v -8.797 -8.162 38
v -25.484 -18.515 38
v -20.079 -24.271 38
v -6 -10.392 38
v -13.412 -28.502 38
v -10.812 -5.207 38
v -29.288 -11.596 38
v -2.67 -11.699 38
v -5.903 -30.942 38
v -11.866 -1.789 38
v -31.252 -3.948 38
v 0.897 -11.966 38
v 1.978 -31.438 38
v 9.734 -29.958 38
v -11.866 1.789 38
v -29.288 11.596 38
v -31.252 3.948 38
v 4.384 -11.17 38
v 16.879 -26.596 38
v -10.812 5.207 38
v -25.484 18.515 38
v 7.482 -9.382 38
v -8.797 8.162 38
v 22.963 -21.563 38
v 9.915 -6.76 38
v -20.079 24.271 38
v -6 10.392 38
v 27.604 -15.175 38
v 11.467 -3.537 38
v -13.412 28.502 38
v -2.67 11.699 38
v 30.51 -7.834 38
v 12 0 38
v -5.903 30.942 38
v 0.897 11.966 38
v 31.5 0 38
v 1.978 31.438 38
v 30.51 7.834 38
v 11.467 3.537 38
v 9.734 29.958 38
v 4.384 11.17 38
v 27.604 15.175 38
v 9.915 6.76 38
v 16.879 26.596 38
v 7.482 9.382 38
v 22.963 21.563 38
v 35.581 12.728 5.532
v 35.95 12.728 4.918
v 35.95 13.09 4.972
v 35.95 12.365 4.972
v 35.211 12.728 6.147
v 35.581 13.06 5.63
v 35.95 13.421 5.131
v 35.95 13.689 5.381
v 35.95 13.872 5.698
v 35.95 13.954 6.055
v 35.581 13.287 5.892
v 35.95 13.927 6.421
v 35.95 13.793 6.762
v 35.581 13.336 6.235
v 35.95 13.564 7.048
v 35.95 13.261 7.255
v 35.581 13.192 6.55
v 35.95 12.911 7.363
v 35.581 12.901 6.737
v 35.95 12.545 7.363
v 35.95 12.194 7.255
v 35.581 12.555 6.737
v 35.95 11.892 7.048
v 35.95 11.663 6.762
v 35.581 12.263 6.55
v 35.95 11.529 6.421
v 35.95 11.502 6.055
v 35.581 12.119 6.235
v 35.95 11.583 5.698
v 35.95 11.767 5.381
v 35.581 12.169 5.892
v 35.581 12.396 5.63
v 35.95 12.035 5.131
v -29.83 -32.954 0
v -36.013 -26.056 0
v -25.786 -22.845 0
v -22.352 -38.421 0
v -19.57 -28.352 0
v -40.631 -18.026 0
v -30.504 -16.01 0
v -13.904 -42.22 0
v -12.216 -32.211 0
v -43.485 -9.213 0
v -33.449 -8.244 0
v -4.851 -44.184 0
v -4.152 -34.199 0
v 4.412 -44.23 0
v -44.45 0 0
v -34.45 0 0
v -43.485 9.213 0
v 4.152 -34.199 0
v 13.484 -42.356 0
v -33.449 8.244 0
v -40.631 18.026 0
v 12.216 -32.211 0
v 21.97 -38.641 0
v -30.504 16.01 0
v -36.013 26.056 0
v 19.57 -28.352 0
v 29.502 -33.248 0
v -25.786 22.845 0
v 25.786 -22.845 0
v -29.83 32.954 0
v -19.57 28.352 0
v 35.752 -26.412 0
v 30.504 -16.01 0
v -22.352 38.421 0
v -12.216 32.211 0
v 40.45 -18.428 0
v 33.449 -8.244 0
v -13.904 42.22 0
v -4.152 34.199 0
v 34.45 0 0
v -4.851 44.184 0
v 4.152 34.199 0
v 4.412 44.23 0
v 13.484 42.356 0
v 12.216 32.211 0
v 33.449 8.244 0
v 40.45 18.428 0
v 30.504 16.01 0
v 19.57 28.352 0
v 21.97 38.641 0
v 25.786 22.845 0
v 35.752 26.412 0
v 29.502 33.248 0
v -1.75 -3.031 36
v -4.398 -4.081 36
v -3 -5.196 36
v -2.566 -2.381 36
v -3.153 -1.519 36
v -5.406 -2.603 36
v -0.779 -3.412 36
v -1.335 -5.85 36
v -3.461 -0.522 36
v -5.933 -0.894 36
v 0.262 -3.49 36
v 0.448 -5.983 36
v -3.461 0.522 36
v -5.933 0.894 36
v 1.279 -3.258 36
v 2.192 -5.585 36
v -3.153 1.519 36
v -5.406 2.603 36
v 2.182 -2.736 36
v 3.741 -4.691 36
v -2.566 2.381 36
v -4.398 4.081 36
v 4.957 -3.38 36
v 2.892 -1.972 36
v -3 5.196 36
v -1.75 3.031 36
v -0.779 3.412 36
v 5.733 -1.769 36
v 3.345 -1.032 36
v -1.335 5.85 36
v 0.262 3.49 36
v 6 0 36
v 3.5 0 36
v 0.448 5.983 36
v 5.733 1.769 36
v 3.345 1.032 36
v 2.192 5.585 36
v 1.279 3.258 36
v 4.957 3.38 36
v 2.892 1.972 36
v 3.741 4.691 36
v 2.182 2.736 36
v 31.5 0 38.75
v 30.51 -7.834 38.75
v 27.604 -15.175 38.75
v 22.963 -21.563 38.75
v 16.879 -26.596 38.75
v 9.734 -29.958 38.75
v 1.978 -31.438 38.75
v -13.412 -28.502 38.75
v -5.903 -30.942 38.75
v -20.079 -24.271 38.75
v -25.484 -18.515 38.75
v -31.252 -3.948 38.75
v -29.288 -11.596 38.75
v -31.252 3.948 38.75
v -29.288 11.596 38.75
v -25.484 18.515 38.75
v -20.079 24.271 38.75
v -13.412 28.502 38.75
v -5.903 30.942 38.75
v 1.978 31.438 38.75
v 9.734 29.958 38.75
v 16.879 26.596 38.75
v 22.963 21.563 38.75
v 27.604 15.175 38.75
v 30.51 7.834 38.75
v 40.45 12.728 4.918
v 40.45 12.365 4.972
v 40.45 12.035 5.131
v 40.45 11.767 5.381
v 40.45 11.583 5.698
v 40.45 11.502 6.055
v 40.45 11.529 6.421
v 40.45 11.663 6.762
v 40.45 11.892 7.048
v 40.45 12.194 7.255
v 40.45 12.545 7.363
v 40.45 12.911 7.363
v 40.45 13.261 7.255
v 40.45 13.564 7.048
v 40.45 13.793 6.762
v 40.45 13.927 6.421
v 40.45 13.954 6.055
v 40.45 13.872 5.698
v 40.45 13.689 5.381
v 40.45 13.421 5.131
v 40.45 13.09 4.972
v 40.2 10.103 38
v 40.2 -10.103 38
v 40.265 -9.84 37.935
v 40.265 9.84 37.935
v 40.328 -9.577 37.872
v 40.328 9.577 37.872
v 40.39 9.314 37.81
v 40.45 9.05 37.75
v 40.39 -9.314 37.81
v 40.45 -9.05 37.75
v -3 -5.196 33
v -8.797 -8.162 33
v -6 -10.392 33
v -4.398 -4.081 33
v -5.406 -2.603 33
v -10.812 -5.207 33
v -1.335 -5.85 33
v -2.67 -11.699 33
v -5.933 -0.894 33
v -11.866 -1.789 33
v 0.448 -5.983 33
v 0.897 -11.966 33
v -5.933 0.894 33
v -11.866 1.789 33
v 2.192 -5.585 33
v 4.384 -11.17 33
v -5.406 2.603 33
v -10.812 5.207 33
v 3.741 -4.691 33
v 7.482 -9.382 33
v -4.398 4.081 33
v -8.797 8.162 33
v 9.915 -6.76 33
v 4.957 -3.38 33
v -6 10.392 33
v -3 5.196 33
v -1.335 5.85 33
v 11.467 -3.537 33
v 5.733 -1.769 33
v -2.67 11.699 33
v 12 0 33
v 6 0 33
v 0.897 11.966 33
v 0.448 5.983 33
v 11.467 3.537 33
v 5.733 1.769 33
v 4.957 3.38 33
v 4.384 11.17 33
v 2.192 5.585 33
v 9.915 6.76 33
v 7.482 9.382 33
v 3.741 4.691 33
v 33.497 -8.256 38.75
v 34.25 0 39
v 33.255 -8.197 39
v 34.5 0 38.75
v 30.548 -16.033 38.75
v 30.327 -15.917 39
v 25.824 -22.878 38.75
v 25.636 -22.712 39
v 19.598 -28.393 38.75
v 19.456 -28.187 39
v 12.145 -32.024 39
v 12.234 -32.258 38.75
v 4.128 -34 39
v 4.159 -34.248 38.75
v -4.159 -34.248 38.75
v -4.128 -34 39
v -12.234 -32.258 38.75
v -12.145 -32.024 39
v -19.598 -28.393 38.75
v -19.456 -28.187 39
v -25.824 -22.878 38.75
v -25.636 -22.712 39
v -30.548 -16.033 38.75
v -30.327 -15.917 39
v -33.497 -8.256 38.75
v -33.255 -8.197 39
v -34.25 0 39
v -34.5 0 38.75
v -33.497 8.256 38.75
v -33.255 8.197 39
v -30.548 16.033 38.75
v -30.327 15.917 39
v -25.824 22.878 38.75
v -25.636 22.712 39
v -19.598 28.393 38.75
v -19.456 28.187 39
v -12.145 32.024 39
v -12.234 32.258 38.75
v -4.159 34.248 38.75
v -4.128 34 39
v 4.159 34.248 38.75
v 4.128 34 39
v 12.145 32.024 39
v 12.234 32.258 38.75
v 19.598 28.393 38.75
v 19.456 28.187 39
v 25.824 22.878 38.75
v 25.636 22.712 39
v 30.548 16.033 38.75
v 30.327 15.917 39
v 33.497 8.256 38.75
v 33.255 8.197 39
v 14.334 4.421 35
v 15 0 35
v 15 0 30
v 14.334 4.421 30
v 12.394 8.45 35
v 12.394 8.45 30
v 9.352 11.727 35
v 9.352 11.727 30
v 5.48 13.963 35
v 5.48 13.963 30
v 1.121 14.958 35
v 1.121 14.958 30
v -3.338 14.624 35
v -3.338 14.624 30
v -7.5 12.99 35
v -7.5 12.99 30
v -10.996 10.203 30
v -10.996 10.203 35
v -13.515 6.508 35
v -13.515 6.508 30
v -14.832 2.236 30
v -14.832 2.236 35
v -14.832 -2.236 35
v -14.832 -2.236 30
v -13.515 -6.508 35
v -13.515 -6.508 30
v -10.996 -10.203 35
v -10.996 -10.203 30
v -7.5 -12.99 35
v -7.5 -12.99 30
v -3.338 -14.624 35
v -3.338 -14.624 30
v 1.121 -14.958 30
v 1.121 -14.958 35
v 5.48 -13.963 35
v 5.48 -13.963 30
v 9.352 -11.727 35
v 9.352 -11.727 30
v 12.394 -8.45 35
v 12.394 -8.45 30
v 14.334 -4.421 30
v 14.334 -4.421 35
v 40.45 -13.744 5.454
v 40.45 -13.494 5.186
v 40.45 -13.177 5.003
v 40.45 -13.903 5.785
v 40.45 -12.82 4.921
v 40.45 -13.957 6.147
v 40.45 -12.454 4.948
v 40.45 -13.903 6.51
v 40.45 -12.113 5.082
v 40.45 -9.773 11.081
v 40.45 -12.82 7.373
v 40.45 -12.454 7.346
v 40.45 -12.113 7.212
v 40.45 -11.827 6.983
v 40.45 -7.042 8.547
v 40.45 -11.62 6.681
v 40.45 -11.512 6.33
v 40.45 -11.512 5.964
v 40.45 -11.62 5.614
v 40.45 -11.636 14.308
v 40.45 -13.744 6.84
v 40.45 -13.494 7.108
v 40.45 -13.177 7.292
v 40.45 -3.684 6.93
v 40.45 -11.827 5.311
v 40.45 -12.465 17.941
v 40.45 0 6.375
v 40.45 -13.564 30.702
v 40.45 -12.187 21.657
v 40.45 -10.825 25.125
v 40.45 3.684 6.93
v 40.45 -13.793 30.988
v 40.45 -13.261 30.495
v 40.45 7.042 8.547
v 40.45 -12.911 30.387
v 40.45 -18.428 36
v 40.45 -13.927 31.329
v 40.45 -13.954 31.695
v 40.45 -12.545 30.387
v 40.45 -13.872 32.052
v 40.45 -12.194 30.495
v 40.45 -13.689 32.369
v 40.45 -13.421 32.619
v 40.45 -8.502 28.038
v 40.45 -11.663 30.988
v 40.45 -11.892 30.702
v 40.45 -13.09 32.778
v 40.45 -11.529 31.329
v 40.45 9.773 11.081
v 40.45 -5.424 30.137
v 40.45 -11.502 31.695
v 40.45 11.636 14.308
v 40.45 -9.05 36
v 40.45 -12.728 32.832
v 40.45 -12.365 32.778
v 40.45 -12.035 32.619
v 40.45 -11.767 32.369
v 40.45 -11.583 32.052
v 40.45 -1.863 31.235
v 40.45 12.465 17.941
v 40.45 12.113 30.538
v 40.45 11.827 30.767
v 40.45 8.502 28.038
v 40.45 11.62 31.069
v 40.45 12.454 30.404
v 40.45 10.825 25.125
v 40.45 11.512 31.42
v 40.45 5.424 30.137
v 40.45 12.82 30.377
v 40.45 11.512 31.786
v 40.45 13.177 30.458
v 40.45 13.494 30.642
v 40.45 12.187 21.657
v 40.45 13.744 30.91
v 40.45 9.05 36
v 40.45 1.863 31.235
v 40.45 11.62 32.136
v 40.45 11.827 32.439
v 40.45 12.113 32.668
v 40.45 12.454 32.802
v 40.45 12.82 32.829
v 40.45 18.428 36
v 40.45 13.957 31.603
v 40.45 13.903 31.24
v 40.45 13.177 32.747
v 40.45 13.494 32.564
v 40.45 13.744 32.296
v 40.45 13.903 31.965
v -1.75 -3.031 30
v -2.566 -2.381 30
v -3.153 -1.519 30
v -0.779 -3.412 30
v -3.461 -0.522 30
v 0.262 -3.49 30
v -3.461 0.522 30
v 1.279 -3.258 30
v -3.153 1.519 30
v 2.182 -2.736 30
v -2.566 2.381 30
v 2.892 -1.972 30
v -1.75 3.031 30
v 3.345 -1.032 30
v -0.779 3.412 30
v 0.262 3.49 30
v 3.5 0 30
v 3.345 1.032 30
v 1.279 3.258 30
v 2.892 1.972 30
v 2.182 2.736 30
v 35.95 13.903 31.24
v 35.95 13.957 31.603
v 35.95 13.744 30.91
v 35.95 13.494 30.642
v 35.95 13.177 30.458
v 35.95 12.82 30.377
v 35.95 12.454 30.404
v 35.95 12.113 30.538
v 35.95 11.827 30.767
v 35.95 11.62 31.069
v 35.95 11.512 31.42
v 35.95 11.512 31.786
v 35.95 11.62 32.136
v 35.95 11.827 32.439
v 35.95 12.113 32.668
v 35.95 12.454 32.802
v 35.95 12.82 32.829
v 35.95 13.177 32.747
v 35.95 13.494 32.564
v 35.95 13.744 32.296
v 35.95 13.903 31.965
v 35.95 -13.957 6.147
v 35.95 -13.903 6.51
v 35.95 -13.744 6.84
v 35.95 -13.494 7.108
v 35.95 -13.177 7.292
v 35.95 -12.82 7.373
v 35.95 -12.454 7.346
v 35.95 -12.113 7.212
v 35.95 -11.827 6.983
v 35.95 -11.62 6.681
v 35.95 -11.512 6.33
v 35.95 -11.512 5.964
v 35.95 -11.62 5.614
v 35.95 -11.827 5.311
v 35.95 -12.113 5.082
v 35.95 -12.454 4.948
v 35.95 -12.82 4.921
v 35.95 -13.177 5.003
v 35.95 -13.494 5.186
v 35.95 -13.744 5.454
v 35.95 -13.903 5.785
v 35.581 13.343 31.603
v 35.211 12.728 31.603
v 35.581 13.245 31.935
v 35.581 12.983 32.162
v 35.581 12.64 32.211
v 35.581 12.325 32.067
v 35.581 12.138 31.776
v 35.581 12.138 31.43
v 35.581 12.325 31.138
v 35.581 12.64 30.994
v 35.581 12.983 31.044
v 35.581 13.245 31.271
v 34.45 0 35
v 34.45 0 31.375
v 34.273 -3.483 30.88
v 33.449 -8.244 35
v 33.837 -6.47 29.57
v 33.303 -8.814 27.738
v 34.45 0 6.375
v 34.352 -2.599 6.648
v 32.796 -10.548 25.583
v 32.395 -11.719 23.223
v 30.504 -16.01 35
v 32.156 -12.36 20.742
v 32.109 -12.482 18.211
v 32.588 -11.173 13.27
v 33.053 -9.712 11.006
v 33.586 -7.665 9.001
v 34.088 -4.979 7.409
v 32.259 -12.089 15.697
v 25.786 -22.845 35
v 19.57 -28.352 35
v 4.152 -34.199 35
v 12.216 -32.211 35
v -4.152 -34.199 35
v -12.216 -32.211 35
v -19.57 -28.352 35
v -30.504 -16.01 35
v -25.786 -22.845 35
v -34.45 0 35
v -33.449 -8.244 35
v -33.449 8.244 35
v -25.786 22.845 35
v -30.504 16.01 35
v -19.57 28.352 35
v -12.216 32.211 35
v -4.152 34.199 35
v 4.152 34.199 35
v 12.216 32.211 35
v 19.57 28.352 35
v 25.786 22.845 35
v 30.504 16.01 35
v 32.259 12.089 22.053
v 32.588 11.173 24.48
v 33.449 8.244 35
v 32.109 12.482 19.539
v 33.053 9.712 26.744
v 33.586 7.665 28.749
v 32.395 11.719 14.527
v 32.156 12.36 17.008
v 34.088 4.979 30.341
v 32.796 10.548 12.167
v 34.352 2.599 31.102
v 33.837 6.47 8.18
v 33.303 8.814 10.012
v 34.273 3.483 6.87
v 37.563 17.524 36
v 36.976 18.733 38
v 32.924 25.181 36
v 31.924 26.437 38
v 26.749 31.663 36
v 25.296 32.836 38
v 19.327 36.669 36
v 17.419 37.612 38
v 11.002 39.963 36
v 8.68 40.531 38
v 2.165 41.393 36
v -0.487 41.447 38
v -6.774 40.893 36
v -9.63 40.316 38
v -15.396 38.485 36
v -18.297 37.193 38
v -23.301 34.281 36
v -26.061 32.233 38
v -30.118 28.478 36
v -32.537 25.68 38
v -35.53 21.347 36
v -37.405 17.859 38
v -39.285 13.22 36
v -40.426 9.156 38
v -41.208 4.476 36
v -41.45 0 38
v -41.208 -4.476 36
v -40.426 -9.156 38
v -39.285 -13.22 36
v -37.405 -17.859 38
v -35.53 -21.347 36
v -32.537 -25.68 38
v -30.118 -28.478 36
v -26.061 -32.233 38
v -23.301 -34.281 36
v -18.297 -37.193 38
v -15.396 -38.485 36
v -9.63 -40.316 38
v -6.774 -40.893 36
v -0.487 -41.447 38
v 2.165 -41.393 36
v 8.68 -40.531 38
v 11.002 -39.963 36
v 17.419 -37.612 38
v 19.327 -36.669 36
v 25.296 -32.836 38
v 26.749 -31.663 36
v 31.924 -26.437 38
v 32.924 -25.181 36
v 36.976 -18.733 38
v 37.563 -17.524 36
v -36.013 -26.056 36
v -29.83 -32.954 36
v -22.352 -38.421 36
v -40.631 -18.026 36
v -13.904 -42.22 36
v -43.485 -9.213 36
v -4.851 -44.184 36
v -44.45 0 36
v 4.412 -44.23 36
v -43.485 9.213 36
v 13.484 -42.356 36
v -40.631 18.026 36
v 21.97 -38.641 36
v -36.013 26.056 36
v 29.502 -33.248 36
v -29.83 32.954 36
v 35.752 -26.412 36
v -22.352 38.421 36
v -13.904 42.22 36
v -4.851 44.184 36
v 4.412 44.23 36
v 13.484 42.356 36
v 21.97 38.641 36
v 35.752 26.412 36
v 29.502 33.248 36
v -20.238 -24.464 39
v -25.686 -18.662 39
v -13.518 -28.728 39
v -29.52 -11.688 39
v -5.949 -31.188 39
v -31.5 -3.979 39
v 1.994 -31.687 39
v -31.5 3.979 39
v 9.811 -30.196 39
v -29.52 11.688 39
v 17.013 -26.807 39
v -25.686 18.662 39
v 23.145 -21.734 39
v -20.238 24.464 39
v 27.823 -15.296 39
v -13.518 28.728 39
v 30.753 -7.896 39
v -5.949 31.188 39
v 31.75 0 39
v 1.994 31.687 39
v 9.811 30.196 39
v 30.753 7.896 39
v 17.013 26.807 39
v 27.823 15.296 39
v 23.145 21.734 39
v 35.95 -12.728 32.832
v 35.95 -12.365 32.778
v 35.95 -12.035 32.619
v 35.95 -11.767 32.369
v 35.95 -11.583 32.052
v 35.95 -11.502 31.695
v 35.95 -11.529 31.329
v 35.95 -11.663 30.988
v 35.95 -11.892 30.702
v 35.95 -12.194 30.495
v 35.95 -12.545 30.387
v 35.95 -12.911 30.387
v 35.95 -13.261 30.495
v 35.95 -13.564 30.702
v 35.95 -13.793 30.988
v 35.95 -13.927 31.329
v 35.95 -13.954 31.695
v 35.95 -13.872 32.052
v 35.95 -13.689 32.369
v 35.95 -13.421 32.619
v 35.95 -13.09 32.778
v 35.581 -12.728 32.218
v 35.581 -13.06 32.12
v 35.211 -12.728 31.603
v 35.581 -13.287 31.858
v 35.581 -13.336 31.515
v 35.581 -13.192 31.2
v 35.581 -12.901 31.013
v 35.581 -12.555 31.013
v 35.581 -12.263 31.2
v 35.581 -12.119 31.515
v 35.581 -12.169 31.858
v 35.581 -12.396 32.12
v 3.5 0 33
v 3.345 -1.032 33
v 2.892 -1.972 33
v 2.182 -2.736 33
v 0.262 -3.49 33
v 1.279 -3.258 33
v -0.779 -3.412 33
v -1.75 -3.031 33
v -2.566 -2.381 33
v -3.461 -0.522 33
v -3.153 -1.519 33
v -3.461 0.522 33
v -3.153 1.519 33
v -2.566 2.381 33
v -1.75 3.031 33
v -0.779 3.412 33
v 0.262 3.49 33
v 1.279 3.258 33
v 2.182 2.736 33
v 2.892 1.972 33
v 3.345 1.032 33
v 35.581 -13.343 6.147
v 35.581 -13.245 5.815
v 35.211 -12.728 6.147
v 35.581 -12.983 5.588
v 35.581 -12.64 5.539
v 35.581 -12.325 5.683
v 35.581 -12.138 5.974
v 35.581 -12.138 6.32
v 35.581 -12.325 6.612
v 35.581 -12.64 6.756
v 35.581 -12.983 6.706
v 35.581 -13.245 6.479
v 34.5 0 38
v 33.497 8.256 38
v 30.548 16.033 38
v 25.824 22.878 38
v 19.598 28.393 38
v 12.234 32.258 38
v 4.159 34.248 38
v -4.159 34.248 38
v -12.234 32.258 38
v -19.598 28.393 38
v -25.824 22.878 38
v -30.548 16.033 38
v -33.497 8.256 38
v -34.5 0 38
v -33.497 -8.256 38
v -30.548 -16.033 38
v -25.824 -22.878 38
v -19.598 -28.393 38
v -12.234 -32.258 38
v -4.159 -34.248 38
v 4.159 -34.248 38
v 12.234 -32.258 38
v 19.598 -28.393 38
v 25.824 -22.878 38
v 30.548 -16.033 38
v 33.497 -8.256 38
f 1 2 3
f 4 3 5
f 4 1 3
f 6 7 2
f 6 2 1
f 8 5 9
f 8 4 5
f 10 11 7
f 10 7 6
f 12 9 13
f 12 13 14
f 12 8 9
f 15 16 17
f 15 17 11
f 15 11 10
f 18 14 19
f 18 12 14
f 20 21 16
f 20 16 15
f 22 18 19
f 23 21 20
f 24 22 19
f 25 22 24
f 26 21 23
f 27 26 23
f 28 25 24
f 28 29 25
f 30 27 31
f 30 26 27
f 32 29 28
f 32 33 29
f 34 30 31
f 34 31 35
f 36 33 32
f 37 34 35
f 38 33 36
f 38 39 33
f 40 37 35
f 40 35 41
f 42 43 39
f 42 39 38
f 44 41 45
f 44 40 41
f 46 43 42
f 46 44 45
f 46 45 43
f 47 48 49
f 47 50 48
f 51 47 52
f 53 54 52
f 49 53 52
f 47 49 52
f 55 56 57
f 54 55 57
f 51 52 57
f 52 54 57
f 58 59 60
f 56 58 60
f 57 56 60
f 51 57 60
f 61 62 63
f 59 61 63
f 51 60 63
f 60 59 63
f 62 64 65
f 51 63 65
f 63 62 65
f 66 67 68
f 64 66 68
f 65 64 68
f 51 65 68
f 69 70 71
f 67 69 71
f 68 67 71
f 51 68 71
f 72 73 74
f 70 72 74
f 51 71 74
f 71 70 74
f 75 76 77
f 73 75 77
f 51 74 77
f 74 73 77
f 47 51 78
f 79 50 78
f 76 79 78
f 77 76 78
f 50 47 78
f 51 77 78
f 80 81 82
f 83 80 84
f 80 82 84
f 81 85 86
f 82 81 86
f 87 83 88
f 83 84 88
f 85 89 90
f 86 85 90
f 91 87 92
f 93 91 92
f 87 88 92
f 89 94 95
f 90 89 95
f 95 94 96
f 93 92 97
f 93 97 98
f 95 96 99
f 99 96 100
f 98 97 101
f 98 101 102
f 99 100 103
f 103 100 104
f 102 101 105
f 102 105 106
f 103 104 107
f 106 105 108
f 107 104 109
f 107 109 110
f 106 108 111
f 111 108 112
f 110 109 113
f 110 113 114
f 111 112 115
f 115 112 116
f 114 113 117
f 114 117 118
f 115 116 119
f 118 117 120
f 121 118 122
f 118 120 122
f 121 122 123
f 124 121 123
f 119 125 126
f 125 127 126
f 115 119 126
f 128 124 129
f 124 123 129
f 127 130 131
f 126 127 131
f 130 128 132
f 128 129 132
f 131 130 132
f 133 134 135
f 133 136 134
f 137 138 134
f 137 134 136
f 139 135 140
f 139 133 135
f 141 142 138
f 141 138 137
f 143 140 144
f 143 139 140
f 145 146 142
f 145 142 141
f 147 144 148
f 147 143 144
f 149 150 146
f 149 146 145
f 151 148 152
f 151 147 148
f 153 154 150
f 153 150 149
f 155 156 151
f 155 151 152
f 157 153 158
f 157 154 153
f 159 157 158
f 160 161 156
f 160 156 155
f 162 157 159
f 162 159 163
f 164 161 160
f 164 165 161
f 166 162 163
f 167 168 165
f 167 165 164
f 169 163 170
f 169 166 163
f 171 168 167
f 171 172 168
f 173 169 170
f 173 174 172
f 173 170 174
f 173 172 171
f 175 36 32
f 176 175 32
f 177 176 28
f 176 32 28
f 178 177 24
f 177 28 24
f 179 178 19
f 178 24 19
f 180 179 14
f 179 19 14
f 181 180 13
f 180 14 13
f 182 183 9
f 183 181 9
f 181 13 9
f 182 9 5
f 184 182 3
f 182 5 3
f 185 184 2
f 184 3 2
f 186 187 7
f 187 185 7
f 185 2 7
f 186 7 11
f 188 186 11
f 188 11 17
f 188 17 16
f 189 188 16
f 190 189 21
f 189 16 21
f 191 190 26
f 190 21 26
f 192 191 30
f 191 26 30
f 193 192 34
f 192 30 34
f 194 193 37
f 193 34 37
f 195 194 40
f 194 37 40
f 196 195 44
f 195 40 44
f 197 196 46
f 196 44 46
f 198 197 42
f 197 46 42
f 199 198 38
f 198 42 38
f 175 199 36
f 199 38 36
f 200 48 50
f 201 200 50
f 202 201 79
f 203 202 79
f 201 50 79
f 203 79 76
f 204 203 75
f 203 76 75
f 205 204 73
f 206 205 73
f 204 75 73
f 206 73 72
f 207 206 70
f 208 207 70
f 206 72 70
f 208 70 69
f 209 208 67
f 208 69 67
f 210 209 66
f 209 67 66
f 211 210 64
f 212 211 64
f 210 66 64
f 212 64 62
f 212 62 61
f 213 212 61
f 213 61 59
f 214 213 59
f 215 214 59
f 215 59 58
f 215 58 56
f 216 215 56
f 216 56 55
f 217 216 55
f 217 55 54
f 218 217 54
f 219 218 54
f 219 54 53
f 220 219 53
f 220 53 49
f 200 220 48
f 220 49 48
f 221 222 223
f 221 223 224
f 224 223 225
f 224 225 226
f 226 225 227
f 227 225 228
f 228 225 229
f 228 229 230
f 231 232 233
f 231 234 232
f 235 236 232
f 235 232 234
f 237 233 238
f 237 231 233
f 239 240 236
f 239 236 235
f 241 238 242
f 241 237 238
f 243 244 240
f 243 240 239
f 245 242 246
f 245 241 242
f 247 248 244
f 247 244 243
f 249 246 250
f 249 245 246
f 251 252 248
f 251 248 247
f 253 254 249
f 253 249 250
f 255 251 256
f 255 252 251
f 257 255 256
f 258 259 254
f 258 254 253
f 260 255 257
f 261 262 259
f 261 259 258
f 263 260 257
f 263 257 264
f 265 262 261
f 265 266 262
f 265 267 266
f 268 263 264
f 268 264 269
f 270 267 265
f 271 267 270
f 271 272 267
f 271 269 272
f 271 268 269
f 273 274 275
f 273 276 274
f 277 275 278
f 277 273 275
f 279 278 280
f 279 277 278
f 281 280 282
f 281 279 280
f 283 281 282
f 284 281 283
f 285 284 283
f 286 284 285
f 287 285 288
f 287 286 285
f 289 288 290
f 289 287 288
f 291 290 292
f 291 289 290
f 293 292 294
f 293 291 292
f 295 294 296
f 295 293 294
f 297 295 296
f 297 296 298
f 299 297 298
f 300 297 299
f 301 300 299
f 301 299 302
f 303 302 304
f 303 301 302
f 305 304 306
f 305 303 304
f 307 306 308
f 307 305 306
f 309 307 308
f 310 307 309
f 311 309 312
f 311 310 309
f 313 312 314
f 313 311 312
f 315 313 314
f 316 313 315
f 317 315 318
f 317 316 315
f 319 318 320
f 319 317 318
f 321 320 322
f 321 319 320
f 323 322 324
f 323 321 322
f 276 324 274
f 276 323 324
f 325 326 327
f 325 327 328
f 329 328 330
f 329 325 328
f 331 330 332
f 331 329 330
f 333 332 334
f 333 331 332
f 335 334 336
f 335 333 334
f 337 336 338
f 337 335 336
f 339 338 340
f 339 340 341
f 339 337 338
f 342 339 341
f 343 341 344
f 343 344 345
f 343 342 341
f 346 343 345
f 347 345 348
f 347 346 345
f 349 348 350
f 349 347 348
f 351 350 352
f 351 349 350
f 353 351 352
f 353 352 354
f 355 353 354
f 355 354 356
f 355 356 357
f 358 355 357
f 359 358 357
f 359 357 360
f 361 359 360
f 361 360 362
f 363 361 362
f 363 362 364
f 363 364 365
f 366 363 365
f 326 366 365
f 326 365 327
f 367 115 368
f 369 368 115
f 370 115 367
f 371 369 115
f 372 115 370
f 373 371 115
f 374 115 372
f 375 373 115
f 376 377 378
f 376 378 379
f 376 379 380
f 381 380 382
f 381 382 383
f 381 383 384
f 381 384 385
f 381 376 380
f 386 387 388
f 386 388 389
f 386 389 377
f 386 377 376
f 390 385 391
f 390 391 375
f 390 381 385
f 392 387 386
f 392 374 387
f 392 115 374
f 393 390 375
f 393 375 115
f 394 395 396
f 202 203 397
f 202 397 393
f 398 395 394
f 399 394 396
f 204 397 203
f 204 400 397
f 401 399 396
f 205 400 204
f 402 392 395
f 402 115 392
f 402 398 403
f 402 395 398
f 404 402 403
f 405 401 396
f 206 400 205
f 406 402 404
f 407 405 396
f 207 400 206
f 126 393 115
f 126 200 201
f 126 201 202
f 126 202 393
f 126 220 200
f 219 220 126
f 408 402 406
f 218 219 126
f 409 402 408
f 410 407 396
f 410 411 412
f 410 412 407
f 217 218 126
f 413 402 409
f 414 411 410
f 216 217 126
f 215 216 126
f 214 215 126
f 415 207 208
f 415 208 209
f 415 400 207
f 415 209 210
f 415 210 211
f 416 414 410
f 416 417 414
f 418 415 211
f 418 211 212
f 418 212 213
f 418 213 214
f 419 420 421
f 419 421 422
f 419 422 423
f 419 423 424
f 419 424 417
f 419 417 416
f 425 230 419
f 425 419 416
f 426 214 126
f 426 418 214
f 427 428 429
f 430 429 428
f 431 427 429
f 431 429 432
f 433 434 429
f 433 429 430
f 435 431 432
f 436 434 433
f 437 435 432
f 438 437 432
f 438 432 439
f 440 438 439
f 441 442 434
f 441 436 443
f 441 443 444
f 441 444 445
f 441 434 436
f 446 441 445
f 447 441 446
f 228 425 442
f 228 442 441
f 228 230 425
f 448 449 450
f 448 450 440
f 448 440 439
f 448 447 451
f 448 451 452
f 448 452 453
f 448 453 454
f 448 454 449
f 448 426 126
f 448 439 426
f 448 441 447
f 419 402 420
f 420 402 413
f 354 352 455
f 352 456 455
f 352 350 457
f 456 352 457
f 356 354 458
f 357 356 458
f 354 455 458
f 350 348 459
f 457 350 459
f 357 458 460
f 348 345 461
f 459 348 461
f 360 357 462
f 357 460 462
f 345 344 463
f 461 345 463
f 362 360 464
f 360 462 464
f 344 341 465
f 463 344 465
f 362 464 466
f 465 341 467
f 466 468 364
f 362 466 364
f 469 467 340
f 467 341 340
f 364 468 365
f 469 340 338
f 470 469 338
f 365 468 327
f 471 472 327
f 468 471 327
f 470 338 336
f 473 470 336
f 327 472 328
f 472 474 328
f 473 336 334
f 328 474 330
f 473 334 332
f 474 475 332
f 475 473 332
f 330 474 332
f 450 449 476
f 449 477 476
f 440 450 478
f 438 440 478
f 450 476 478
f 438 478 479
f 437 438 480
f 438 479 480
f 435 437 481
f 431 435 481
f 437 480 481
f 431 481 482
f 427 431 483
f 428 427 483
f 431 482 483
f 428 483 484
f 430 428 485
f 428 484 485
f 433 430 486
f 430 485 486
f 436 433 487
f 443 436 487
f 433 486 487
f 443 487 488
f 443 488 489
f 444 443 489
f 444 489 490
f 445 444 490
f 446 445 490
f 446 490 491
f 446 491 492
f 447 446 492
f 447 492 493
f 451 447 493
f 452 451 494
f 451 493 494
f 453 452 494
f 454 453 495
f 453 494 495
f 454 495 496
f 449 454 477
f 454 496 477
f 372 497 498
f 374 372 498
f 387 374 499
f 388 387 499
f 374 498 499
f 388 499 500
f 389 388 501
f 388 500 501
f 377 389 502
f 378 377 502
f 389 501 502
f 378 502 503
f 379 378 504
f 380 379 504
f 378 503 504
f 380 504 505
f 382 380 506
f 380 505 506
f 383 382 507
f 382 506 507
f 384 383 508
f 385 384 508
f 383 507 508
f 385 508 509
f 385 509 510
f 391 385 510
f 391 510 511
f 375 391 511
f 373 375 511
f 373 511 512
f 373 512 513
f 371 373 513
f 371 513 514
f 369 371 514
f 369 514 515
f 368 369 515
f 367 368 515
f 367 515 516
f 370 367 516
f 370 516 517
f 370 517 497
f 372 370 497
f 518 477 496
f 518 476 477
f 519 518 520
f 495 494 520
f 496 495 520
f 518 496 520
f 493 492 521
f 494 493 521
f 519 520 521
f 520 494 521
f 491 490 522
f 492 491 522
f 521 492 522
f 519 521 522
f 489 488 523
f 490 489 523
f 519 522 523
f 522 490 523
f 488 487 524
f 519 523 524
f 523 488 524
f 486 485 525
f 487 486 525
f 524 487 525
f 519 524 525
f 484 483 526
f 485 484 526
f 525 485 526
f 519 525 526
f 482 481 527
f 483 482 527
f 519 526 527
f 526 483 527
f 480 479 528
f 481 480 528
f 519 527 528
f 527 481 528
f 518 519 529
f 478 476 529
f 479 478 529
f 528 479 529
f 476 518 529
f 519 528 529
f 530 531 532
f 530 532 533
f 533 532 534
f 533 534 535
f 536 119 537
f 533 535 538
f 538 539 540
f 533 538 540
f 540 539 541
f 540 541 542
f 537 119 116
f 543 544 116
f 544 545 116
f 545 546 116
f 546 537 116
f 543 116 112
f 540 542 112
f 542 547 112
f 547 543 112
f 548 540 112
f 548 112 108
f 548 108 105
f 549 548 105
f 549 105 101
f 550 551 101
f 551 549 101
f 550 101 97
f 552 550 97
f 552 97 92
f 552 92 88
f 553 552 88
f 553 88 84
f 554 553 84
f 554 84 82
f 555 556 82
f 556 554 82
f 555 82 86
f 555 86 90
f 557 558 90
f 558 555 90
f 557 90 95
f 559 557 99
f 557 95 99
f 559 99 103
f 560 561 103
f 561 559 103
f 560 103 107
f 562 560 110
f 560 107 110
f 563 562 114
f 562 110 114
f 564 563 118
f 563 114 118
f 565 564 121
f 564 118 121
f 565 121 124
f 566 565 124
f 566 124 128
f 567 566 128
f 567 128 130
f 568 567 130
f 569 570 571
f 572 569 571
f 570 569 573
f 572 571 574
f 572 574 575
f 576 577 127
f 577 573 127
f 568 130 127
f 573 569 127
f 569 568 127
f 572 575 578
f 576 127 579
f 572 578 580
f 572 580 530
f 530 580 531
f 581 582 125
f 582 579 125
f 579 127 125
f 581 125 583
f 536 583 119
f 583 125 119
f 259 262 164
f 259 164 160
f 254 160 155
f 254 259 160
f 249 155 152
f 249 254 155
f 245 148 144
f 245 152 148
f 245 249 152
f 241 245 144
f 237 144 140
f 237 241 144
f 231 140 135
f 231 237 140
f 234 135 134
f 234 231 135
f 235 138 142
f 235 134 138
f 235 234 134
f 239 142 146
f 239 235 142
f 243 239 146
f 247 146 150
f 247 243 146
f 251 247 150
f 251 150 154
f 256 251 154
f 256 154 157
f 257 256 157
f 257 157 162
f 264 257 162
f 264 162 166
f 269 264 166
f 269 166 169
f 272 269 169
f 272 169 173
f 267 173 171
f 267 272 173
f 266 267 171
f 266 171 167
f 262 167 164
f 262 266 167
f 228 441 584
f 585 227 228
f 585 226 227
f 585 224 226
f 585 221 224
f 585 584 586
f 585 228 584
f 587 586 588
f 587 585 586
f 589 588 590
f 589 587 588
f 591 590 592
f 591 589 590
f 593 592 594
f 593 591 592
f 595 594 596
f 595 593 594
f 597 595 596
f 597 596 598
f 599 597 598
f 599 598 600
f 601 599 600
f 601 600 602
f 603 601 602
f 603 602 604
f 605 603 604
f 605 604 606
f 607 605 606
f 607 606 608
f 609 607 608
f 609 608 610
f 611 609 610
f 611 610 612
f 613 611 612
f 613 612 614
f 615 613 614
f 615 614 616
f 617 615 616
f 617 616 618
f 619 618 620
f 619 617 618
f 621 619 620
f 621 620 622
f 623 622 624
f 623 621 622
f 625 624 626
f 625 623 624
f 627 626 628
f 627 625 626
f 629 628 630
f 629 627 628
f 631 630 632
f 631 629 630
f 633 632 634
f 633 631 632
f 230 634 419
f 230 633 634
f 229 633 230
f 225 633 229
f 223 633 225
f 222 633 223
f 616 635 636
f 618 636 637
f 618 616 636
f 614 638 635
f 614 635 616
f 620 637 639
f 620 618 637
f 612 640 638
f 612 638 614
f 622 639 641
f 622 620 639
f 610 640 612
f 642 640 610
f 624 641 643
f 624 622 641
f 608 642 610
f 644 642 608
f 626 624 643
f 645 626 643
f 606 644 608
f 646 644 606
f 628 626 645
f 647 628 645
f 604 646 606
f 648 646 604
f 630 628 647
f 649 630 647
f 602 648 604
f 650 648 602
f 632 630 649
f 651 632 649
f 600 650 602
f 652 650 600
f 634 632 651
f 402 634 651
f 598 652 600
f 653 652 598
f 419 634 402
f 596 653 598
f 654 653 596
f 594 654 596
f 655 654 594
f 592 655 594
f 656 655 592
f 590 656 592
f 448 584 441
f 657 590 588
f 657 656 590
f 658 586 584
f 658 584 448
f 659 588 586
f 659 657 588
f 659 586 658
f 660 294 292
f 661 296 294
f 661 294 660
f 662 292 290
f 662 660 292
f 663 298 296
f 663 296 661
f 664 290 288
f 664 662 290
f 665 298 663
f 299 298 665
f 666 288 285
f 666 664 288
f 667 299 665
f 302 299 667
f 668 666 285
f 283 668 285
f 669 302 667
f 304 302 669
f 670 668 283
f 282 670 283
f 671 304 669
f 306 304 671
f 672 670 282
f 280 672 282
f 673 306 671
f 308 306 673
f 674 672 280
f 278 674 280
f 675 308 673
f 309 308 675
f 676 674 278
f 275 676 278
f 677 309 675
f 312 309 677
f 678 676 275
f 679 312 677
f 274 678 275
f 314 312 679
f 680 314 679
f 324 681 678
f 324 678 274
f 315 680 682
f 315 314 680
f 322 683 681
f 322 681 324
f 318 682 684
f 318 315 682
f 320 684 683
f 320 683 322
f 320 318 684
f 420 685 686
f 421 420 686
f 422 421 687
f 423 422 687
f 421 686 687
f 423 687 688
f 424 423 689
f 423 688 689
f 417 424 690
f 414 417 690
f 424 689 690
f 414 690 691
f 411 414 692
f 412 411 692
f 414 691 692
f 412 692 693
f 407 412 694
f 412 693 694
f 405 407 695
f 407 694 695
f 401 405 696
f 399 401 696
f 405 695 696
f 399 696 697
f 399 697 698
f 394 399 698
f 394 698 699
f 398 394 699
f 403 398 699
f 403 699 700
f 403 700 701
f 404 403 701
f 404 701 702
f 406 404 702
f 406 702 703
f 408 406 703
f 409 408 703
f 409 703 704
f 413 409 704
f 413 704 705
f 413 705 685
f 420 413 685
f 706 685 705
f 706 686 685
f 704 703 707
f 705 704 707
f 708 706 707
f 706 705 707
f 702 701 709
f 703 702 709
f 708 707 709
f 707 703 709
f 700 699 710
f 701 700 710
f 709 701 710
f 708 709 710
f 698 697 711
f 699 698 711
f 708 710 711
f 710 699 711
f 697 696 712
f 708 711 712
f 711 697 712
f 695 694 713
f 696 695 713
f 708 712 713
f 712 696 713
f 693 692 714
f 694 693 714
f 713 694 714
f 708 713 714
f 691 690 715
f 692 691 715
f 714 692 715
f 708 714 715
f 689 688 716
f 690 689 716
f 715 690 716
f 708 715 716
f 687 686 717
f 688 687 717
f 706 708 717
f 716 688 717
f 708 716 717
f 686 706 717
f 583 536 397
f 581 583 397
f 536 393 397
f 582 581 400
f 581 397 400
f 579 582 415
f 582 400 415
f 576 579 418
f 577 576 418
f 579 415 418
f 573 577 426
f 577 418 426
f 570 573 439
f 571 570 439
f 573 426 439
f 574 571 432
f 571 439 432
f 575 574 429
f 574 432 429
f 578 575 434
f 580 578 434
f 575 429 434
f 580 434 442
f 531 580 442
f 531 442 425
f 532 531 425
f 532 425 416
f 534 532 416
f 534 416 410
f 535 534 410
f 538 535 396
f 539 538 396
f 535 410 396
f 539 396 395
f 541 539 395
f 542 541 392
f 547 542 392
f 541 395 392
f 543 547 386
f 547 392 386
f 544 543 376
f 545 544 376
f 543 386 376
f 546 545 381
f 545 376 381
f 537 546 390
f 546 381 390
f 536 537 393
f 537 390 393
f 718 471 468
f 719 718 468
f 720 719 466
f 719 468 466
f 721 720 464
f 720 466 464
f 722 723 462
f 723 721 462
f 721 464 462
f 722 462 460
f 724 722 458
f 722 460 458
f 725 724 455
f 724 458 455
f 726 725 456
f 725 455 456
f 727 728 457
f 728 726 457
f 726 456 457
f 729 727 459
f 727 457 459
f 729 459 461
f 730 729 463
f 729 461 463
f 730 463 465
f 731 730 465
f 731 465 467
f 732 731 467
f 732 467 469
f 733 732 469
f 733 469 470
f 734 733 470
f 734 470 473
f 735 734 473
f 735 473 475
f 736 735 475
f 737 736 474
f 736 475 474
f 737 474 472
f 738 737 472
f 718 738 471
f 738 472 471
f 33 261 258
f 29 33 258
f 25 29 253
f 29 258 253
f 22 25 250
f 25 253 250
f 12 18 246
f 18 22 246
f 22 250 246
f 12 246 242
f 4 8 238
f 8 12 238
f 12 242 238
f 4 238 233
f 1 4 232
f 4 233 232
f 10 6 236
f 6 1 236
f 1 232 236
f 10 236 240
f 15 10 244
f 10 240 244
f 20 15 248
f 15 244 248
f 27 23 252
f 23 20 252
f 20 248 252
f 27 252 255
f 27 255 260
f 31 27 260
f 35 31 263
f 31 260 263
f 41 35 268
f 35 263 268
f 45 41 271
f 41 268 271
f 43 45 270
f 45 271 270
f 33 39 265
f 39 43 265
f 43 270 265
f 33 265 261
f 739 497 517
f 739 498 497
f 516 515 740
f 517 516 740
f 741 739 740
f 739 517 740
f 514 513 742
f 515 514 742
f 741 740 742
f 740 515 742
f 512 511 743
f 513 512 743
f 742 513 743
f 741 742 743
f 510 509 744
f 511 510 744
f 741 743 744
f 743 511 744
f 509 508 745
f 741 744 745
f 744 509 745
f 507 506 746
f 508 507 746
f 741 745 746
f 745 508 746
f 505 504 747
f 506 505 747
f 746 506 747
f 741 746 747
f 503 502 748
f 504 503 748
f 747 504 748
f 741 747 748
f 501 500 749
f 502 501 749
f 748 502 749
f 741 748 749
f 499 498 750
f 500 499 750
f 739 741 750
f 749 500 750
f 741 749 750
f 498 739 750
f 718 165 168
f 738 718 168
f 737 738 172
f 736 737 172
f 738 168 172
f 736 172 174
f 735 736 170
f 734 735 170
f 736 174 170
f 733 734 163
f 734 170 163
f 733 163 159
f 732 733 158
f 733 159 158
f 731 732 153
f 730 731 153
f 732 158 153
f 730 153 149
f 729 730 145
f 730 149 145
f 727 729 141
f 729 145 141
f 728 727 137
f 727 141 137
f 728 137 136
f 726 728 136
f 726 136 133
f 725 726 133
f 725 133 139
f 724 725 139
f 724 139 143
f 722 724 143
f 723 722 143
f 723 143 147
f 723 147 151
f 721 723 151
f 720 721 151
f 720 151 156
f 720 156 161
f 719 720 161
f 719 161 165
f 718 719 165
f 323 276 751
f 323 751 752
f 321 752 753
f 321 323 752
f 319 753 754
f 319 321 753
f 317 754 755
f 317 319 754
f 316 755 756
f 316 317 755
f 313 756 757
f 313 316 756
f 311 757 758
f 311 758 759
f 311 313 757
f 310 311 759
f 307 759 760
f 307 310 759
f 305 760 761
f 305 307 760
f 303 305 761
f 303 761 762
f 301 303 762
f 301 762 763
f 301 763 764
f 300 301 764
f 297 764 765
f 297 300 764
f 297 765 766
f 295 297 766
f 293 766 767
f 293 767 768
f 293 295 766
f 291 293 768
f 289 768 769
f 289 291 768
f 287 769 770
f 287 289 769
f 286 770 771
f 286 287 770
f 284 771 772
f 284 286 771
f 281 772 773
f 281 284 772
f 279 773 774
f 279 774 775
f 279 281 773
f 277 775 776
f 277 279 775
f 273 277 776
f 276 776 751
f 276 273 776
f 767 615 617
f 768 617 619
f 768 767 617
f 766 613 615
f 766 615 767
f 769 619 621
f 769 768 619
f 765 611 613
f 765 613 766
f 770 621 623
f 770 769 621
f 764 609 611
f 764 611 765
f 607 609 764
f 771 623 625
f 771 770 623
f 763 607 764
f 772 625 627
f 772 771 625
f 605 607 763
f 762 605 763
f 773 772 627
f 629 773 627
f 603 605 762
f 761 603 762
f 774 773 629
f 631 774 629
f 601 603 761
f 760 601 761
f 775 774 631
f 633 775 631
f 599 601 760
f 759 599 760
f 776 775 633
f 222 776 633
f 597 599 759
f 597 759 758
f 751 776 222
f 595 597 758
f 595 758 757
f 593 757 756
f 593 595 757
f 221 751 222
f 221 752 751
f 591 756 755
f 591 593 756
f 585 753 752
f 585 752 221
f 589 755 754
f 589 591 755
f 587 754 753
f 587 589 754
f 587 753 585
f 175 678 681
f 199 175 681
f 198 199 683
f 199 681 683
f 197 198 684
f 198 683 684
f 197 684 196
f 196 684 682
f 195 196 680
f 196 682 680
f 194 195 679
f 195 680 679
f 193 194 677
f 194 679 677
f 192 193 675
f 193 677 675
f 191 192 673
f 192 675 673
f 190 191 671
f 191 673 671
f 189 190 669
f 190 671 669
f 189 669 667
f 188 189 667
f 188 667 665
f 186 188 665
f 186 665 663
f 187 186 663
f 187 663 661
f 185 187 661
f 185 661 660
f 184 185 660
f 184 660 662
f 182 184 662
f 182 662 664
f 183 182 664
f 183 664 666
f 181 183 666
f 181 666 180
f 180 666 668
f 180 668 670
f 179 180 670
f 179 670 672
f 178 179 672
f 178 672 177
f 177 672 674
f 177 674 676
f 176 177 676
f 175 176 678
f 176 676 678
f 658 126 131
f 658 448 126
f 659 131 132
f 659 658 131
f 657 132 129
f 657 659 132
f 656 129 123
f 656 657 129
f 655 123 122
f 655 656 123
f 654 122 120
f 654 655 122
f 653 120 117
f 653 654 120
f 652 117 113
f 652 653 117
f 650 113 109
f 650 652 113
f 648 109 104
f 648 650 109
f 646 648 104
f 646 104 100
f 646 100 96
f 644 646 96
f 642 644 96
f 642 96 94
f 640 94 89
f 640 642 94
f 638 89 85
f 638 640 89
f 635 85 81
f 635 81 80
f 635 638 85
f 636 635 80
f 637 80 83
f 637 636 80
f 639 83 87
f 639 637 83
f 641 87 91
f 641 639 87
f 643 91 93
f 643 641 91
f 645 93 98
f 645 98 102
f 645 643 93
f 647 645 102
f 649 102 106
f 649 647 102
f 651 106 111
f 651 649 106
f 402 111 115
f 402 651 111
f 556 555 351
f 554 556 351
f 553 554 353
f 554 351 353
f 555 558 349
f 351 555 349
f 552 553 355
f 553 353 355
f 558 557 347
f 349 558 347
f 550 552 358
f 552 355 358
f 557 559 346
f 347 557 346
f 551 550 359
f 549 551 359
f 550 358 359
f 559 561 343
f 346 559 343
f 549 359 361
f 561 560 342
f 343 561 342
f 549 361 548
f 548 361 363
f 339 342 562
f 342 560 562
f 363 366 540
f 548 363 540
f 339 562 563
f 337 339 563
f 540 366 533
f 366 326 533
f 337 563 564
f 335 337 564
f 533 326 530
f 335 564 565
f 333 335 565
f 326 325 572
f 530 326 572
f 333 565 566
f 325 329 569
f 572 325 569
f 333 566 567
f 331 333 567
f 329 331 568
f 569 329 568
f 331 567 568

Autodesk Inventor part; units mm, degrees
ref_plane "XZ Plane" through (0, 0, 0) normal (0, 1, 0) x (-1, 0, 0)
ref_plane "XY Plane" through (0, 0, 0) normal (0, 0, 1) x (1, 0, 0)
sketch "Sketch1" plane through (0, 0, 0) normal (0, 1, 0) x (-1, 0, 0)
  line L0 (0, 0) -> (0, 38)
  line L1 (-3.5, 30) -> (-15, 30)
  line L2 (-15, 30) -> (-15, 35)
  line L3 (-15, 35) -> (-34.45, 35)
  line L4 (-34.45, 35) -> (-34.45, 0)
  line L5 (-34.45, 0) -> (-44.45, 0)
  line L6 (-44.45, 0) -> (-44.45, 38)
  line L7 (-44.45, 38) -> (-34.5, 38)
  line L8 (-34.5, 38) -> (-34.5, 39)
  line L9 (-34.5, 39) -> (-31.5, 39)
  line L10 (-31.5, 39) -> (-31.5, 38)
  line L11 (-31.5, 38) -> (-12, 38)
  line L12 (-12, 33) -> (-3.5, 33)
  line L13 (-12, 38) -> (-12, 33)
  line L14 (-3.5, 33) -> (-3.5, 30)
  line L15 (-3.5, 33) -> (-3.5, 36)
  line L16 (-3.5, 36) -> (-6, 36)
  line L17 (-6, 36) -> (-6, 33)
  dimension "d5" = 69
  dimension "d6" = 3
  dimension "d7" = 1
  dimension "d8" = 88.9
  dimension "d10" = 3
  dimension "d11" = 5
  dimension "d12" = 30
  dimension "d37" = 10
  dimension "d64" = 38
  dimension "d74" = 7
  dimension "d75" = 24
  dimension "d76" = 3
  dimension "d77" = 2.5
  dimension "d78" = 3
revolve "Revolution1" add sketch "Sketch1" angle 360 about axis through (0, 0, 0) along (0, 0, 1)
ref_plane "Work Plane1" through (44.45, 0, 19) normal (1, 0, 0) x (0, 1, 0)
sketch "Sketch7" plane through (44.45, 0, 19) normal (1, 0, 0) x (0, 1, 0)
  line L0 (34.45, 16) -> (-34.45, 16) projected
  line L1 (34.45, -19) -> (-34.45, -19) projected
  line L2 (34.45, 16) -> (-34.45, 16) projected
  line L3 (0, 16) -> (0, -19) construction
  line L4 (57.5, 28.575) -> (-57.5, 28.575)
  line L5 (-57.5, 28.575) -> (-57.5, -31.575)
  line L6 (-57.5, -31.575) -> (57.5, -31.575)
  line L7 (57.5, -31.575) -> (57.5, 28.575)
  line L8 (57.5, 28.575) -> (-57.5, -31.575) construction
  line L9 (-57.5, 28.575) -> (57.5, -31.575) construction
  point P0 (0, -1.5)
  dimension "d79" = 115
  dimension "d80" = 60.1501
extrude "Extrusion5" cut sketch "Sketch7" against normal blind 4
chamfer "Chamfer1" distance 0.25 angle 45 4 edges at (-44.45, 0, 38) (-34.5, 0, 39) (-31.5, 0, 39) (40.45, 0, 38)
sketch "Sketch8" plane through (40.45, 0, 19) normal (1, 0, 0) x (0, 0, -1)
  circle A0 centre (0.125, 0) radius 12.5
  line L0 (19, 44.45) -> (19, -44.45) projected
  line L1 (-19, -44.2) -> (-19, 44.2) projected
  line L2 (19, -18.4282) -> (-18.75, -18.4282) projected
  point P0 (19, 0)
  point P1 (19, 18.4282)
  point P2 (-19, -18.3739)
  point P3 (-19, 18.3739)
  point P4 (19, 0)
  point P5 (0.125, -18.4282)
  dimension "d44" = 25
extrude "Extrusion6" cut sketch "Sketch8" against normal blind 20
sketch "Sketch10" plane through (40.45, 0, 19) normal (1, 0, 0) x (0, 0, -1)
  circle A0 centre (0.125, 0) radius 12.5 projected
  line L0 (0.125, 0) -> (19, 0)
  line L1 (19, 18.4282) -> (19, -18.4282) projected
  line L2 (0.125, 0) -> (12.8529, 12.7279)
  point P0 (19, 0)
  dimension "d51" = 18
  dimension "d65" = 45
hole "Hole2" at (40.45, 12.7279, 6.1471) direction (-1, 0, 0) diameter 2.459 depth 4.5 tip angle 118 thread size "M3x0.5" class "6H" standard "ISO Metric profile"
pattern_circular "Circular Pattern1" count 4 over 360 about axis through (40.45, 0, 18.875) along (-1, 0, 0) of "Hole2"
sketch "Sketch12" plane through (0, 0, 38) normal (0, 0, 1) x (1, 0, 0)
  circle A0 centre (0, 0) radius 41.45
  circle A1 centre (0, 0) radius 44.45
  point P0 (0, 0)
  dimension "d81" = 82.9
  dimension "d82" = 88.9
extrude "Extrusion9" cut sketch "Sketch12" against normal blind 2
properties part number "008" material "Steel, Carbon"
